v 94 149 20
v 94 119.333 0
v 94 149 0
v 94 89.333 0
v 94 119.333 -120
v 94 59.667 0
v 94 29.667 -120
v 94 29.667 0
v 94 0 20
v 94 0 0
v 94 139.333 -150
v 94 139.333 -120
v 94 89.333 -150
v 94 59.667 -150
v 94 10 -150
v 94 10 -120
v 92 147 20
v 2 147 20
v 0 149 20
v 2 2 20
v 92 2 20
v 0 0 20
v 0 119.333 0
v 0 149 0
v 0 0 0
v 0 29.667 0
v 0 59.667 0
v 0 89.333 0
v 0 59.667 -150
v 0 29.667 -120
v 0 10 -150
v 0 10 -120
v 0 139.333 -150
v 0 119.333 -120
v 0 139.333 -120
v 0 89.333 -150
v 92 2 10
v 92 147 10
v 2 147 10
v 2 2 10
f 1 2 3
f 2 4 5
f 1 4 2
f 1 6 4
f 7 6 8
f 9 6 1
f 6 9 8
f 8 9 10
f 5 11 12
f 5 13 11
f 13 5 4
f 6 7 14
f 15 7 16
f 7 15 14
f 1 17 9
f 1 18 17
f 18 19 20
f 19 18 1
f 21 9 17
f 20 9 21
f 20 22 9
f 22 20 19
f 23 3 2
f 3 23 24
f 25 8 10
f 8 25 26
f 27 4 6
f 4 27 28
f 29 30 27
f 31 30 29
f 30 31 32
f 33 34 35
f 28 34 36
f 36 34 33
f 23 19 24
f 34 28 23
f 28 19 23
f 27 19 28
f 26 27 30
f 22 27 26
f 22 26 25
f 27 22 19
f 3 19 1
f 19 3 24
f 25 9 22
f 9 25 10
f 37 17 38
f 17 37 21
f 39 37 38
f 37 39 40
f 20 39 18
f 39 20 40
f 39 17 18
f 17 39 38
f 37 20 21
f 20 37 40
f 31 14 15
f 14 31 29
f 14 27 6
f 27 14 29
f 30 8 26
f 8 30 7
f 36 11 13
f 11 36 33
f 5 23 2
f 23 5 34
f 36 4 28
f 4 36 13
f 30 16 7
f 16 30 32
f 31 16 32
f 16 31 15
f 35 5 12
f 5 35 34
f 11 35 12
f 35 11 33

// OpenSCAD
l = 145;
w = 90;
t = 2;
pants_h = 10;
leg_h = 150;
leg_t = 30;

difference(){
	cube([w + 2*t, l + 2*t, 2*pants_h]);
	translate([t,t,pants_h])
	cube([w, l, pants_h]);
}

for(y = [10+(1/3)*(l + 2*t)-leg_t,-10+(2/3)*(l + 2*t)]){
	translate([0,y,-leg_h])
	cube([w + 2*t,leg_t,leg_h]);
}

for(y = [10,-10+(2/3)*(l + 2*t) + (2/3)*leg_t]){
	translate([0,y,-leg_h])
	cube([w + 2*t,leg_t,leg_t]);
}
